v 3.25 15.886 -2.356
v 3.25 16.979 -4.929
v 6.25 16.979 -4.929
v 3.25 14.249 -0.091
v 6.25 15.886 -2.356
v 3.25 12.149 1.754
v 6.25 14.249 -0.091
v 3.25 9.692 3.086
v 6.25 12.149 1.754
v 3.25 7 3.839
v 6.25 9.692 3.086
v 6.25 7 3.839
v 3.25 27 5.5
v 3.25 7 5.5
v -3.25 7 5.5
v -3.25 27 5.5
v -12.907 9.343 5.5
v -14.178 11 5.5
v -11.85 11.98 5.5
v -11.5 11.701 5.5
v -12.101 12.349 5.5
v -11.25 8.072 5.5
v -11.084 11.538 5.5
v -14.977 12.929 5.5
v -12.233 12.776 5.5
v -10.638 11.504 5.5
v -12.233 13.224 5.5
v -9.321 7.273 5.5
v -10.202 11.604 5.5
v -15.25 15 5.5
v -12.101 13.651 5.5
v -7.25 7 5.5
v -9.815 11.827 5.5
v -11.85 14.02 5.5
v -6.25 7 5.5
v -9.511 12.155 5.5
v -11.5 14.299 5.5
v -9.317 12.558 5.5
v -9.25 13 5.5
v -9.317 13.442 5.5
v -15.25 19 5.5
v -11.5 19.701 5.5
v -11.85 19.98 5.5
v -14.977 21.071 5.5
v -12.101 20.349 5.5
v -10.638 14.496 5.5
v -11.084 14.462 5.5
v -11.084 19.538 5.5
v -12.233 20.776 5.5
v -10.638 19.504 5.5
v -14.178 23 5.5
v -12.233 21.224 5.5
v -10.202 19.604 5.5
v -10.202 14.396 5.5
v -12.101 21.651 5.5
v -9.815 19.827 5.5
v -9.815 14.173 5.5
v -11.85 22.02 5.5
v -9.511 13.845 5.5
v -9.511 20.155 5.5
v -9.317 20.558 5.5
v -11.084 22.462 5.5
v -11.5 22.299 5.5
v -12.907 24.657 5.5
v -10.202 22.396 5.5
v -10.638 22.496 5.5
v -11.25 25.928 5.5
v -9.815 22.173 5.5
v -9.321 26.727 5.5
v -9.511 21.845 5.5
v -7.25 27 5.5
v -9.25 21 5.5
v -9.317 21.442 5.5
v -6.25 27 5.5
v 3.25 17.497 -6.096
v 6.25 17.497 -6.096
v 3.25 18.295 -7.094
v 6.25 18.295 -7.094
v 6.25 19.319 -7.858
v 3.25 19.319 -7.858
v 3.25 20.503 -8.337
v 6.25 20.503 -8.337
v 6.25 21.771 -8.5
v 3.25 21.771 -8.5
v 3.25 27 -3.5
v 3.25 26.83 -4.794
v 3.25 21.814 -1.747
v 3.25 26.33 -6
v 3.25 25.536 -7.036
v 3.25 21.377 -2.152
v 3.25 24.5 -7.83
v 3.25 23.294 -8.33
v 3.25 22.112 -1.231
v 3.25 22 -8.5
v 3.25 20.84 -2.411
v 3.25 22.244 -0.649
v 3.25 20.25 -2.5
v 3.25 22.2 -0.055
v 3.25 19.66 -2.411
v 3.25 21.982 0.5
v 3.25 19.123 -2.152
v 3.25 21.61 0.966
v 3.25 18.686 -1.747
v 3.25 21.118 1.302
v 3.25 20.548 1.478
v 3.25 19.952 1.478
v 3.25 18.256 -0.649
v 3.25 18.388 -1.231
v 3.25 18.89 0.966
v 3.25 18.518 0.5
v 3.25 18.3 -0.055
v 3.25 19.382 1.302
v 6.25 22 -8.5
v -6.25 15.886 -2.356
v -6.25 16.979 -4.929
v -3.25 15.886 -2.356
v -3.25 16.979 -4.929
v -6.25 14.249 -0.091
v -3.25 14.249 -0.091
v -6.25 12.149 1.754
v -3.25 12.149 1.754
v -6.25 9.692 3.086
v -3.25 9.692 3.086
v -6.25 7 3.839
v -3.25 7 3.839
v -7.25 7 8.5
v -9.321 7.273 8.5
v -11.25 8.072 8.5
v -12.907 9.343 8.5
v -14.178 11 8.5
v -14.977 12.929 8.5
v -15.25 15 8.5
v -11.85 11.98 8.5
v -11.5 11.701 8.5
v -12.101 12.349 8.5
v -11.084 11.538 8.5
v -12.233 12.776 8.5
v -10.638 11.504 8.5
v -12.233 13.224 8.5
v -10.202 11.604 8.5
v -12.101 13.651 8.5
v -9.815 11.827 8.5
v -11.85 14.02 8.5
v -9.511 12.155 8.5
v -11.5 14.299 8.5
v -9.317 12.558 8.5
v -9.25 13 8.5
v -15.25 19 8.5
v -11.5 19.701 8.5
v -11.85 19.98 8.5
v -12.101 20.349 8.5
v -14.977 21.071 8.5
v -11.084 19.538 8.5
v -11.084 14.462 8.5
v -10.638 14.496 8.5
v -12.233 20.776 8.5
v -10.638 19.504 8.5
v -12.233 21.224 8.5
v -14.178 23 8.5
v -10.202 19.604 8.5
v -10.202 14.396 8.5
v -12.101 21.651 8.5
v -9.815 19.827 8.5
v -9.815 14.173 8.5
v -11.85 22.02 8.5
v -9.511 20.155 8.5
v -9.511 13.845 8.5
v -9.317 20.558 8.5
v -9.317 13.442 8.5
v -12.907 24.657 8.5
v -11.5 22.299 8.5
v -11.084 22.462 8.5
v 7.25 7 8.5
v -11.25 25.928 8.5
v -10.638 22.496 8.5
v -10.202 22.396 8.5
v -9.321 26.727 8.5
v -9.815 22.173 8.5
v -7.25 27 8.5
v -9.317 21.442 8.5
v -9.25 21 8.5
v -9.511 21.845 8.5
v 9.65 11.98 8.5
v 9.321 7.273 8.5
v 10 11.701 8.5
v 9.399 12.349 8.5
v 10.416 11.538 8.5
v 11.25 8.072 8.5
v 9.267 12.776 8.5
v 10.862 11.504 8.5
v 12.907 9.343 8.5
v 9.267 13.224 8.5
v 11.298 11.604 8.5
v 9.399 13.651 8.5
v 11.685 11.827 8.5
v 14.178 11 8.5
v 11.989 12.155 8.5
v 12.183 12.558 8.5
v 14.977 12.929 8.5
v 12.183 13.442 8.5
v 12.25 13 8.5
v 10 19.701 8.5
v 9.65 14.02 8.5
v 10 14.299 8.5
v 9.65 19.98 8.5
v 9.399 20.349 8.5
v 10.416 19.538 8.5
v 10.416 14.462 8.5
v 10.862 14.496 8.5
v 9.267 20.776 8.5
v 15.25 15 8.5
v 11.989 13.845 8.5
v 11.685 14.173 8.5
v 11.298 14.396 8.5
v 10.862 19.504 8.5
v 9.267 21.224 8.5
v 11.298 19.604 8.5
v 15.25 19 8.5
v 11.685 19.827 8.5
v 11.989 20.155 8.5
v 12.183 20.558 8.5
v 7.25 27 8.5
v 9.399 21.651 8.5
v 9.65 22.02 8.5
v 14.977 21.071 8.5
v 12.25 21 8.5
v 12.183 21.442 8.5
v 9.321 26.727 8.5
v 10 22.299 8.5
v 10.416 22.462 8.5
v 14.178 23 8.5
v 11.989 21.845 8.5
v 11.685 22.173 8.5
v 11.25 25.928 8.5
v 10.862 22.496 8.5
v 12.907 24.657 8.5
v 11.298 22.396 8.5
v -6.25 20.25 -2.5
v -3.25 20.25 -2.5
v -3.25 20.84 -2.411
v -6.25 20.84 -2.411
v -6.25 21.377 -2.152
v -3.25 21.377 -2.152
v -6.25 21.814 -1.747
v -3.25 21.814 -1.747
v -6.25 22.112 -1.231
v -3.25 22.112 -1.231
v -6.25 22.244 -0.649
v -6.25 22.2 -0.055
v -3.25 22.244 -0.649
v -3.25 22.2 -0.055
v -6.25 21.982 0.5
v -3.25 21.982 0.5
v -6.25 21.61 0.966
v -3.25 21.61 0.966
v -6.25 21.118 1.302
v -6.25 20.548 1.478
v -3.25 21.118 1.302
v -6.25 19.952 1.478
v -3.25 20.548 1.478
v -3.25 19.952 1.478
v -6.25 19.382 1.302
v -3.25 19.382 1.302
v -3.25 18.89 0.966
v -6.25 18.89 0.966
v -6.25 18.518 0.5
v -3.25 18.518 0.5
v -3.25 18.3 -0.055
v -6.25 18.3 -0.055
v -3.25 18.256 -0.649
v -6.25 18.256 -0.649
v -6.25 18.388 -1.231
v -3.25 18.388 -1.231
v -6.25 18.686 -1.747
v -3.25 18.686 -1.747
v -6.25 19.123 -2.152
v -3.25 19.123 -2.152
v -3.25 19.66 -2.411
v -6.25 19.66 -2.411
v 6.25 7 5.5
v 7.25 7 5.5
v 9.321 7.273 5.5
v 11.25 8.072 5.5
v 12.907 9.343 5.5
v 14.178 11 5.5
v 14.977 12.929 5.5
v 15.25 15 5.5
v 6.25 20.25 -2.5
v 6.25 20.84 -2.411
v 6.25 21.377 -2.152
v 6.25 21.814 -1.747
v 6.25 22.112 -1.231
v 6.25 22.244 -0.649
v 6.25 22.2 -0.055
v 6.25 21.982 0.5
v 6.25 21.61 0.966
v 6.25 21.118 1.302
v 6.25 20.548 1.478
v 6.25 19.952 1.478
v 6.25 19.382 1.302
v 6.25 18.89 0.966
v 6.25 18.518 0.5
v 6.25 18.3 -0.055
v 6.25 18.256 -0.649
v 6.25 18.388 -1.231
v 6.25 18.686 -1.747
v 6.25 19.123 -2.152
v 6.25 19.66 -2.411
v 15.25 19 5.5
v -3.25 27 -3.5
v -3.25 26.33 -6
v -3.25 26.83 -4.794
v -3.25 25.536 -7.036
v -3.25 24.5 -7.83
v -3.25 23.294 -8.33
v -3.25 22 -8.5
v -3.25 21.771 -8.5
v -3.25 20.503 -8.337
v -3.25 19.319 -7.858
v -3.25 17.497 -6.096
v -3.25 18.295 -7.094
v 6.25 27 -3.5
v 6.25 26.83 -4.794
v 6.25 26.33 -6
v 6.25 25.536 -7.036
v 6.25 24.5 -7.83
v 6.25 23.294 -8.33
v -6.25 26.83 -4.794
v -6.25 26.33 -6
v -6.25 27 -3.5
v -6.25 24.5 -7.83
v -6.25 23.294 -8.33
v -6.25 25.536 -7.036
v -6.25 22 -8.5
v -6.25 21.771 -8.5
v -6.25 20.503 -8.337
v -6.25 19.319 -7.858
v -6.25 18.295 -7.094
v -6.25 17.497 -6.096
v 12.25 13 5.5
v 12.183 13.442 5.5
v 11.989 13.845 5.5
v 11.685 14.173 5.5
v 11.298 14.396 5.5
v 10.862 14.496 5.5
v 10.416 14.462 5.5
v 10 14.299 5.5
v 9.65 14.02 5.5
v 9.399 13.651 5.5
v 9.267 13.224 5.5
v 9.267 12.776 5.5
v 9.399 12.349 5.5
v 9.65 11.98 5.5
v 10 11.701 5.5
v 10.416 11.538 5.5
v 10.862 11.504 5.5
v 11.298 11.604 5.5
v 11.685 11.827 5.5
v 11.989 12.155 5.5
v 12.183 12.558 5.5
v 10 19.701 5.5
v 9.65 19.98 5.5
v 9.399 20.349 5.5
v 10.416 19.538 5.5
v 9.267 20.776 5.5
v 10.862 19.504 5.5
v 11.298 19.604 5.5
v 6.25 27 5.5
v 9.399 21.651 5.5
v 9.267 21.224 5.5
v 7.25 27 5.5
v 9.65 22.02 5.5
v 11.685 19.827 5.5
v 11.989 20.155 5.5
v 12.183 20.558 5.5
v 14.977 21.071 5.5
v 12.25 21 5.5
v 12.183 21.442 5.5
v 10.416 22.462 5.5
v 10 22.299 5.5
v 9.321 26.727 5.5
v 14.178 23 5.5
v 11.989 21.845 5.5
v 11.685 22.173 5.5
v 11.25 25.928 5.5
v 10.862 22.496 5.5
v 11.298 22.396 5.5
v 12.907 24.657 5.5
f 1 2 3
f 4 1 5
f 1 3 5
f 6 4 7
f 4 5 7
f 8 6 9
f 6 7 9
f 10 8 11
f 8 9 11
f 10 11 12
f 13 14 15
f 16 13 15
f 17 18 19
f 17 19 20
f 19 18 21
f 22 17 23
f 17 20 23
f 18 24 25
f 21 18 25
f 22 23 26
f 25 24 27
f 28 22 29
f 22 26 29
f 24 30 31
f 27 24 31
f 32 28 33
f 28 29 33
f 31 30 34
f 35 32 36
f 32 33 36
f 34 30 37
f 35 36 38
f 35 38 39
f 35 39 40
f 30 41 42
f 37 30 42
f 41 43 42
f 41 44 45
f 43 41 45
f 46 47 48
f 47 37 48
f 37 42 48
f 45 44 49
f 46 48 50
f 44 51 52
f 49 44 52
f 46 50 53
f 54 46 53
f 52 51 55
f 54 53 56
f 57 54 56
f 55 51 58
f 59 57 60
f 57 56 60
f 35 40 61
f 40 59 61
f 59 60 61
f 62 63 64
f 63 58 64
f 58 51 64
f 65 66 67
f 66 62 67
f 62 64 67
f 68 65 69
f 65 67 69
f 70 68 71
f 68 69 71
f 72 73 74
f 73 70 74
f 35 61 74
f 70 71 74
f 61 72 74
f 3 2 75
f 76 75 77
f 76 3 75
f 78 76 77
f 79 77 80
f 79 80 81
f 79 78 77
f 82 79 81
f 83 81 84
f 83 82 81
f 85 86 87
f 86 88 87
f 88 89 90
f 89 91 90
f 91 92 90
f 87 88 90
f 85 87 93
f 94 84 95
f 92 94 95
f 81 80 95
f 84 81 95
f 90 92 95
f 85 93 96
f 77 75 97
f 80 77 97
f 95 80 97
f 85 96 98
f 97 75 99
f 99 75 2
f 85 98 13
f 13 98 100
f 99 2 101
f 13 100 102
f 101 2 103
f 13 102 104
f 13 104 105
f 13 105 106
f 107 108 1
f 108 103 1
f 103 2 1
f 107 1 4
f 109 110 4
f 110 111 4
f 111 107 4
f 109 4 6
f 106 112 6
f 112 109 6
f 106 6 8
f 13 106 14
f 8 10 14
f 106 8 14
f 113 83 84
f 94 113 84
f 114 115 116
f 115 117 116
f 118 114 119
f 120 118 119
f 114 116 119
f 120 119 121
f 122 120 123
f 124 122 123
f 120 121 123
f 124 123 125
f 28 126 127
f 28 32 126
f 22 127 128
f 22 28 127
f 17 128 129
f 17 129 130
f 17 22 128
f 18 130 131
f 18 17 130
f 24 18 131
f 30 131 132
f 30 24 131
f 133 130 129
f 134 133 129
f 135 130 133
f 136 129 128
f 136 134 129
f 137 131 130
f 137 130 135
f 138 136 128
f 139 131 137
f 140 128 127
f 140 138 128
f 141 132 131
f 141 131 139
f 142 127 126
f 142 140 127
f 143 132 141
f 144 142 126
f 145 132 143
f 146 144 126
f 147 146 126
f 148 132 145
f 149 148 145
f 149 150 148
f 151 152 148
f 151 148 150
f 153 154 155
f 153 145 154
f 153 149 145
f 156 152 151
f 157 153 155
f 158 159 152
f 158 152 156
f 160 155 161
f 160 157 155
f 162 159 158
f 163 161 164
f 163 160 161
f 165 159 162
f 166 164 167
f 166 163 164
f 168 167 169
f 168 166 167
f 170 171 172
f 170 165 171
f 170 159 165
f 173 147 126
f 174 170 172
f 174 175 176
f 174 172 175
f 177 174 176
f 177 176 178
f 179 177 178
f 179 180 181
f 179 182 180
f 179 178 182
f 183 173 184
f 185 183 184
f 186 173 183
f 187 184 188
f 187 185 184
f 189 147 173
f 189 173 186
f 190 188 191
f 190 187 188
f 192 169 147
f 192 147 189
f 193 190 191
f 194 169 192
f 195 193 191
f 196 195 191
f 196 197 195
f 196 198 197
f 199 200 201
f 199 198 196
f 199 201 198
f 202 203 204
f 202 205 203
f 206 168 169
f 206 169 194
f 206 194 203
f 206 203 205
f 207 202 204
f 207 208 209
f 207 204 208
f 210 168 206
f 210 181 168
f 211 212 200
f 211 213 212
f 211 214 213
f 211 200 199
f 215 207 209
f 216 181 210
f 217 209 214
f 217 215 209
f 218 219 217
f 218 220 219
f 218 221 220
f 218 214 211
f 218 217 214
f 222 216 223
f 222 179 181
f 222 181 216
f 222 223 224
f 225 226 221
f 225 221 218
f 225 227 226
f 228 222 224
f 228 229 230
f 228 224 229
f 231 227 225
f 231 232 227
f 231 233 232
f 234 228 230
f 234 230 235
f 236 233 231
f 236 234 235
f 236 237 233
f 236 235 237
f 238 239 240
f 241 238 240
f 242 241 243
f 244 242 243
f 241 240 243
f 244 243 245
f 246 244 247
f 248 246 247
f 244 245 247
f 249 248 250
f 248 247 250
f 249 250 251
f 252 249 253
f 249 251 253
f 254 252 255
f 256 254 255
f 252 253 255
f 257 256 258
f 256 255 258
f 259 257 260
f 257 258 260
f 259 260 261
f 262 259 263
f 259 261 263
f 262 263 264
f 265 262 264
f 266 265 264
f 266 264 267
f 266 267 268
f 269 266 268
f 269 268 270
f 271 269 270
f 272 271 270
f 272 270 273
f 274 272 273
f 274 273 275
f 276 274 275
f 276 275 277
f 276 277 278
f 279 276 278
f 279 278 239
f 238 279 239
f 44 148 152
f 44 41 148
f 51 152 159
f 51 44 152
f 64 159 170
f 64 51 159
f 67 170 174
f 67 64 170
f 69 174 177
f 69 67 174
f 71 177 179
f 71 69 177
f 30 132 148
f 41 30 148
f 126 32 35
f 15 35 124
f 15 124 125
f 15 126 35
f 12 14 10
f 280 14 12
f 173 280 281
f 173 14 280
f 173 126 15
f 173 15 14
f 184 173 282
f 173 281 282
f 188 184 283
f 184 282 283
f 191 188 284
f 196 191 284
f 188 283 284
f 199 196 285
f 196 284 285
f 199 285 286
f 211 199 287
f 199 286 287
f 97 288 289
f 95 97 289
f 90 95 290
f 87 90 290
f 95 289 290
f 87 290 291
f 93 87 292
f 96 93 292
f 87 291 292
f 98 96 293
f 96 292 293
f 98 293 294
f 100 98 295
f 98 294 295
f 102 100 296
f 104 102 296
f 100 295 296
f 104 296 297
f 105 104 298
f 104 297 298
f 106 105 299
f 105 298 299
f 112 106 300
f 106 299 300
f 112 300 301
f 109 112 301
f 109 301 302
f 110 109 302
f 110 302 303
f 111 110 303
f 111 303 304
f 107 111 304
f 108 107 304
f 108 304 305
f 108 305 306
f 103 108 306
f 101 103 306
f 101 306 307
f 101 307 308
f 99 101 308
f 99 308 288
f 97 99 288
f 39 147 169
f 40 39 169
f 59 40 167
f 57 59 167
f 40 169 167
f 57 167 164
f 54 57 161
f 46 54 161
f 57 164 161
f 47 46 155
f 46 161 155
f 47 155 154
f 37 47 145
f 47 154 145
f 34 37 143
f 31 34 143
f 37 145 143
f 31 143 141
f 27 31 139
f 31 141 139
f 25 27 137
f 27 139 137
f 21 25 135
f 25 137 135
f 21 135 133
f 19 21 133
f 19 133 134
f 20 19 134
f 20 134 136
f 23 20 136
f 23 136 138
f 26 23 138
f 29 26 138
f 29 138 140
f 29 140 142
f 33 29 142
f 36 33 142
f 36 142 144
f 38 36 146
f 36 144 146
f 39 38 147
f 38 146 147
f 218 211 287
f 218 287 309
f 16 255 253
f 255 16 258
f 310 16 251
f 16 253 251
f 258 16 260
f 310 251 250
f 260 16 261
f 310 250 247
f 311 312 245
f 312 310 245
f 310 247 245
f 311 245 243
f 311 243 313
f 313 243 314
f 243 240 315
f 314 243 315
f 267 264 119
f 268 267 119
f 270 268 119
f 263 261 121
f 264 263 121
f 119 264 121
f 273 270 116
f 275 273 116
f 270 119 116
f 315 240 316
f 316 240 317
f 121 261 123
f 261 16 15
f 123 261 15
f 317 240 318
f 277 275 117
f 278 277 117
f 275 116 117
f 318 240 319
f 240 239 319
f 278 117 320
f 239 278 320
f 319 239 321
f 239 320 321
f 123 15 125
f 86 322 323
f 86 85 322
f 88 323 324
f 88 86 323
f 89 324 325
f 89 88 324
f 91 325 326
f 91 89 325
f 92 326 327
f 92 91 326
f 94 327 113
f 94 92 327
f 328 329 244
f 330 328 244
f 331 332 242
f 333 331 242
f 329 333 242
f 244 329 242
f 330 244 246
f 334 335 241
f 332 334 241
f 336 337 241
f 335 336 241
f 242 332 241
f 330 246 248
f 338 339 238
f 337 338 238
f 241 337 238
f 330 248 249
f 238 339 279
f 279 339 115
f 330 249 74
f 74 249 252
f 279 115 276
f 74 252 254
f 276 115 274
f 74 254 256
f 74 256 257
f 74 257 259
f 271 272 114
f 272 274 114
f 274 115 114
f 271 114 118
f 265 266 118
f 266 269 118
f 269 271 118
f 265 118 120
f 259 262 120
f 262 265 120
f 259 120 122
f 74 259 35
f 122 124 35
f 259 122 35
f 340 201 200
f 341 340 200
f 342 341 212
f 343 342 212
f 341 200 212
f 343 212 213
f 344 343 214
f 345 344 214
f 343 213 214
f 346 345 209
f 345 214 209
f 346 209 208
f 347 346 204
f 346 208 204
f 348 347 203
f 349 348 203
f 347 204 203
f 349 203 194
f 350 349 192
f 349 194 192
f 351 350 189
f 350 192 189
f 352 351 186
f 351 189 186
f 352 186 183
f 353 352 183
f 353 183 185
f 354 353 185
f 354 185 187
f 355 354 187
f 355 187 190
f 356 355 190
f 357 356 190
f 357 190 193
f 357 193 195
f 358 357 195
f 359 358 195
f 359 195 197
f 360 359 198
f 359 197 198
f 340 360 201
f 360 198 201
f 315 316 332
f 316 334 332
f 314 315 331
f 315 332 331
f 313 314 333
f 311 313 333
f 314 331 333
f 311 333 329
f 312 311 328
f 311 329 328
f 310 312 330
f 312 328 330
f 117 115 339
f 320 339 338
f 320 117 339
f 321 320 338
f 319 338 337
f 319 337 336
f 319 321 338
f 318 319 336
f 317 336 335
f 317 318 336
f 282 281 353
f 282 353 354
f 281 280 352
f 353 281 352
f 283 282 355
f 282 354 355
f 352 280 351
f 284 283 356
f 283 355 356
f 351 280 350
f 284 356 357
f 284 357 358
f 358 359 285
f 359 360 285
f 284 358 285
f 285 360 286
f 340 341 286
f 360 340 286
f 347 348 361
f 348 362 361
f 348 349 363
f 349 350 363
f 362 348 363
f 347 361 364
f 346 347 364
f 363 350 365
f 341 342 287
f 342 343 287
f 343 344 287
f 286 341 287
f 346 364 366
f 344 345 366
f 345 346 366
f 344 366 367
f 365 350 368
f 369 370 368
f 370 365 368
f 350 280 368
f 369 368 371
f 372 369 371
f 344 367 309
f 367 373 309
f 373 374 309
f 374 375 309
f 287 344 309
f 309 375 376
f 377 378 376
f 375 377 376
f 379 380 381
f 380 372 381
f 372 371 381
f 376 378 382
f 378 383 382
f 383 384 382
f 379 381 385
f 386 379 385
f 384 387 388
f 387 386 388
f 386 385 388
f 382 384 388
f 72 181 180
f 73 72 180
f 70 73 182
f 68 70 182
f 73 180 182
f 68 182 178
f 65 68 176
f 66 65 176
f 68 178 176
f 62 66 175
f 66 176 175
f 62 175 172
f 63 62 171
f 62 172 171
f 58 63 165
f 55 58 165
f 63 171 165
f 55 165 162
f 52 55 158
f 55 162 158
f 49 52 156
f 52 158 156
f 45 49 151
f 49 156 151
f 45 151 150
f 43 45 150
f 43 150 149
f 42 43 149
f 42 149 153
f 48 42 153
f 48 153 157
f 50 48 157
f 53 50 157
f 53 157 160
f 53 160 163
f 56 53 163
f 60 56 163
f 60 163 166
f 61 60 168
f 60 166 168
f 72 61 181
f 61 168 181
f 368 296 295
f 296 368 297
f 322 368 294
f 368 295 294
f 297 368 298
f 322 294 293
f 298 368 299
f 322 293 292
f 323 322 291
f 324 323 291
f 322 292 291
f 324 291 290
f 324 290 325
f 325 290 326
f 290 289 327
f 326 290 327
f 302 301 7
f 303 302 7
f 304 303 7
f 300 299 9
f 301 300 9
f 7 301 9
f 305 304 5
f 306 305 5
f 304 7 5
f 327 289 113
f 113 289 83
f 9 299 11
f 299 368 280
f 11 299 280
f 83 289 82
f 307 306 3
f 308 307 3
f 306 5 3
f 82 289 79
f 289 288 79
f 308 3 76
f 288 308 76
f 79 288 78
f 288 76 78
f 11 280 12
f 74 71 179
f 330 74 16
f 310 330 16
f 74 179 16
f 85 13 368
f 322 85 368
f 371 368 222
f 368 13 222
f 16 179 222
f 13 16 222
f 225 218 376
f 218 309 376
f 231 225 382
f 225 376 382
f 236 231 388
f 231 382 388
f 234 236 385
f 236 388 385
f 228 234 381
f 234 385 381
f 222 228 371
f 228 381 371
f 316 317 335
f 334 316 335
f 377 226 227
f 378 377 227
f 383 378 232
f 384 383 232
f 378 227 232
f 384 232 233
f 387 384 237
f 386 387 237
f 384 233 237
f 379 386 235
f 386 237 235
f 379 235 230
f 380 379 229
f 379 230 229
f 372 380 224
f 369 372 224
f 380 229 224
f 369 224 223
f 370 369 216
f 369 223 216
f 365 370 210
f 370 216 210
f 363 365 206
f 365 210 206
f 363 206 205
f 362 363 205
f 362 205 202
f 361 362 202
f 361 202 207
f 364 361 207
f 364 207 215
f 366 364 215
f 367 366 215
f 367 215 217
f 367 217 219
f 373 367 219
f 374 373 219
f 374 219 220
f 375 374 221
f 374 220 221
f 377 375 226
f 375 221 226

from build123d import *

# Parameters (mm, degrees)
EXTRUDE_1_DEPTH     = 27
SKETCH_3_R          = 2
CUT_EXTRUDE_2_DEPTH = 31.943496894
FILLET_1_R          = 5
SKETCH_4_W          = 9
SKETCH_4_H          = 27
SKETCH_4_R          = 1.5
EXTRUDE_2_DEPTH     = 3
FILLET_2_R          = 8
SKETCH_5_W          = 38.66542969
SKETCH_5_H          = 14
CUT_EXTRUDE_3_DEPTH = 36.363293116
FILLET_3_R          = 5
FILLET_4_R          = 8
SKETCH_6_R          = 12.5
CUT_EXTRUDE_5_DEPTH = 36.545745174
FILLET_5_R          = 5


with BuildPart() as part:
    # 草图1 → 凸台-拉伸1 (new body)
    with BuildSketch(Plane(origin=(0, 0, 0), x_dir=(1, 0, 0), z_dir=(0, 1, 0))):
        Polygon((-6.25, 8.5), (-6.25, -8.5), (6.25, -8.5), (6.25, 8.5), (3.25, 8.5), (3.25, -5.5), (-3.25, -5.5), (-3.25, 8.5), align=None)
    extrude(amount=EXTRUDE_1_DEPTH)

    # 草图3 → 切除-拉伸2 (cut, through all)
    with BuildSketch(Plane(origin=(6.25, 0, 0), x_dir=(0, 0, -1), z_dir=(1, 0, 0))):
        with Locations((0.5, 20.25)):
            Circle(SKETCH_3_R)
    extrude(amount=-CUT_EXTRUDE_2_DEPTH, mode=Mode.SUBTRACT)

    # 圆角1
    fillet_1_edges = [part.edges().sort_by_distance(p)[0] for p in [
        (-4.75, 0, -8.5),
        (4.75, 0, -8.5),
        (-4.75, 27, -8.5),
        (4.75, 27, -8.5),
    ]]
    fillet(fillet_1_edges, radius=FILLET_1_R)

    # 草图4 → 凸台-拉伸2 (add)
    # profile 1 of 2: a face of its own
    with BuildSketch(Plane.XY.offset(8.5)):
        with Locations((-10.75, 13.5)):
            Rectangle(SKETCH_4_W, SKETCH_4_H)
        with Locations((-10.75, 13)):
            Circle(SKETCH_4_R, mode=Mode.SUBTRACT)
        with Locations((-10.75, 21)):
            Circle(SKETCH_4_R, mode=Mode.SUBTRACT)
    # profile 2 of 2: a face of its own
    with BuildSketch(Plane.XY.offset(8.5)):
        with Locations((10.75, 13.5)):
            Rectangle(SKETCH_4_W, SKETCH_4_H)
        with Locations((10.75, 13)):
            Circle(SKETCH_4_R, mode=Mode.SUBTRACT)
        with Locations((10.75, 21)):
            Circle(SKETCH_4_R, mode=Mode.SUBTRACT)
    extrude(amount=-EXTRUDE_2_DEPTH)

    # 圆角2
    fillet_2_edges = [part.edges().sort_by_distance(p)[0] for p in [
        (-15.25, 27, 7),
        (15.25, 27, 7),
    ]]
    fillet(fillet_2_edges, radius=FILLET_2_R)

    # 草图5 → 切除-拉伸3 (cut, through all)
    with BuildSketch(Plane.XY.offset(8.5)):
        Rectangle(SKETCH_5_W, SKETCH_5_H)
    extrude(amount=-CUT_EXTRUDE_3_DEPTH, mode=Mode.SUBTRACT)

    # 圆角3
    fillet_3_edges = [part.edges().sort_by_distance(p)[0] for p in [
        (4.75, 7, -8.5),
        (-4.75, 7, -8.5),
    ]]
    fillet(fillet_3_edges, radius=FILLET_3_R)

    # 圆角4
    fillet_4_edges = [part.edges().sort_by_distance(p)[0] for p in [
        (-15.25, 7, 7),
        (15.25, 7, 7),
    ]]
    fillet(fillet_4_edges, radius=FILLET_4_R)

    # 草图6 → 切除-拉伸5 (cut, through all)
    with BuildSketch(Plane(origin=(6.25, 0, 0), x_dir=(0, 0, -1), z_dir=(1, 0, 0))):
        with Locations((8.5, 5)):
            Circle(SKETCH_6_R)
    extrude(amount=-CUT_EXTRUDE_5_DEPTH, mode=Mode.SUBTRACT)

    # 圆角5
    fillet_5_edges = [part.edges().sort_by_distance(p)[0] for p in [
        (4.75, 17.5, -8.5),
        (-4.75, 17.5, -8.5),
    ]]
    fillet(fillet_5_edges, radius=FILLET_5_R)


solid = part.part
